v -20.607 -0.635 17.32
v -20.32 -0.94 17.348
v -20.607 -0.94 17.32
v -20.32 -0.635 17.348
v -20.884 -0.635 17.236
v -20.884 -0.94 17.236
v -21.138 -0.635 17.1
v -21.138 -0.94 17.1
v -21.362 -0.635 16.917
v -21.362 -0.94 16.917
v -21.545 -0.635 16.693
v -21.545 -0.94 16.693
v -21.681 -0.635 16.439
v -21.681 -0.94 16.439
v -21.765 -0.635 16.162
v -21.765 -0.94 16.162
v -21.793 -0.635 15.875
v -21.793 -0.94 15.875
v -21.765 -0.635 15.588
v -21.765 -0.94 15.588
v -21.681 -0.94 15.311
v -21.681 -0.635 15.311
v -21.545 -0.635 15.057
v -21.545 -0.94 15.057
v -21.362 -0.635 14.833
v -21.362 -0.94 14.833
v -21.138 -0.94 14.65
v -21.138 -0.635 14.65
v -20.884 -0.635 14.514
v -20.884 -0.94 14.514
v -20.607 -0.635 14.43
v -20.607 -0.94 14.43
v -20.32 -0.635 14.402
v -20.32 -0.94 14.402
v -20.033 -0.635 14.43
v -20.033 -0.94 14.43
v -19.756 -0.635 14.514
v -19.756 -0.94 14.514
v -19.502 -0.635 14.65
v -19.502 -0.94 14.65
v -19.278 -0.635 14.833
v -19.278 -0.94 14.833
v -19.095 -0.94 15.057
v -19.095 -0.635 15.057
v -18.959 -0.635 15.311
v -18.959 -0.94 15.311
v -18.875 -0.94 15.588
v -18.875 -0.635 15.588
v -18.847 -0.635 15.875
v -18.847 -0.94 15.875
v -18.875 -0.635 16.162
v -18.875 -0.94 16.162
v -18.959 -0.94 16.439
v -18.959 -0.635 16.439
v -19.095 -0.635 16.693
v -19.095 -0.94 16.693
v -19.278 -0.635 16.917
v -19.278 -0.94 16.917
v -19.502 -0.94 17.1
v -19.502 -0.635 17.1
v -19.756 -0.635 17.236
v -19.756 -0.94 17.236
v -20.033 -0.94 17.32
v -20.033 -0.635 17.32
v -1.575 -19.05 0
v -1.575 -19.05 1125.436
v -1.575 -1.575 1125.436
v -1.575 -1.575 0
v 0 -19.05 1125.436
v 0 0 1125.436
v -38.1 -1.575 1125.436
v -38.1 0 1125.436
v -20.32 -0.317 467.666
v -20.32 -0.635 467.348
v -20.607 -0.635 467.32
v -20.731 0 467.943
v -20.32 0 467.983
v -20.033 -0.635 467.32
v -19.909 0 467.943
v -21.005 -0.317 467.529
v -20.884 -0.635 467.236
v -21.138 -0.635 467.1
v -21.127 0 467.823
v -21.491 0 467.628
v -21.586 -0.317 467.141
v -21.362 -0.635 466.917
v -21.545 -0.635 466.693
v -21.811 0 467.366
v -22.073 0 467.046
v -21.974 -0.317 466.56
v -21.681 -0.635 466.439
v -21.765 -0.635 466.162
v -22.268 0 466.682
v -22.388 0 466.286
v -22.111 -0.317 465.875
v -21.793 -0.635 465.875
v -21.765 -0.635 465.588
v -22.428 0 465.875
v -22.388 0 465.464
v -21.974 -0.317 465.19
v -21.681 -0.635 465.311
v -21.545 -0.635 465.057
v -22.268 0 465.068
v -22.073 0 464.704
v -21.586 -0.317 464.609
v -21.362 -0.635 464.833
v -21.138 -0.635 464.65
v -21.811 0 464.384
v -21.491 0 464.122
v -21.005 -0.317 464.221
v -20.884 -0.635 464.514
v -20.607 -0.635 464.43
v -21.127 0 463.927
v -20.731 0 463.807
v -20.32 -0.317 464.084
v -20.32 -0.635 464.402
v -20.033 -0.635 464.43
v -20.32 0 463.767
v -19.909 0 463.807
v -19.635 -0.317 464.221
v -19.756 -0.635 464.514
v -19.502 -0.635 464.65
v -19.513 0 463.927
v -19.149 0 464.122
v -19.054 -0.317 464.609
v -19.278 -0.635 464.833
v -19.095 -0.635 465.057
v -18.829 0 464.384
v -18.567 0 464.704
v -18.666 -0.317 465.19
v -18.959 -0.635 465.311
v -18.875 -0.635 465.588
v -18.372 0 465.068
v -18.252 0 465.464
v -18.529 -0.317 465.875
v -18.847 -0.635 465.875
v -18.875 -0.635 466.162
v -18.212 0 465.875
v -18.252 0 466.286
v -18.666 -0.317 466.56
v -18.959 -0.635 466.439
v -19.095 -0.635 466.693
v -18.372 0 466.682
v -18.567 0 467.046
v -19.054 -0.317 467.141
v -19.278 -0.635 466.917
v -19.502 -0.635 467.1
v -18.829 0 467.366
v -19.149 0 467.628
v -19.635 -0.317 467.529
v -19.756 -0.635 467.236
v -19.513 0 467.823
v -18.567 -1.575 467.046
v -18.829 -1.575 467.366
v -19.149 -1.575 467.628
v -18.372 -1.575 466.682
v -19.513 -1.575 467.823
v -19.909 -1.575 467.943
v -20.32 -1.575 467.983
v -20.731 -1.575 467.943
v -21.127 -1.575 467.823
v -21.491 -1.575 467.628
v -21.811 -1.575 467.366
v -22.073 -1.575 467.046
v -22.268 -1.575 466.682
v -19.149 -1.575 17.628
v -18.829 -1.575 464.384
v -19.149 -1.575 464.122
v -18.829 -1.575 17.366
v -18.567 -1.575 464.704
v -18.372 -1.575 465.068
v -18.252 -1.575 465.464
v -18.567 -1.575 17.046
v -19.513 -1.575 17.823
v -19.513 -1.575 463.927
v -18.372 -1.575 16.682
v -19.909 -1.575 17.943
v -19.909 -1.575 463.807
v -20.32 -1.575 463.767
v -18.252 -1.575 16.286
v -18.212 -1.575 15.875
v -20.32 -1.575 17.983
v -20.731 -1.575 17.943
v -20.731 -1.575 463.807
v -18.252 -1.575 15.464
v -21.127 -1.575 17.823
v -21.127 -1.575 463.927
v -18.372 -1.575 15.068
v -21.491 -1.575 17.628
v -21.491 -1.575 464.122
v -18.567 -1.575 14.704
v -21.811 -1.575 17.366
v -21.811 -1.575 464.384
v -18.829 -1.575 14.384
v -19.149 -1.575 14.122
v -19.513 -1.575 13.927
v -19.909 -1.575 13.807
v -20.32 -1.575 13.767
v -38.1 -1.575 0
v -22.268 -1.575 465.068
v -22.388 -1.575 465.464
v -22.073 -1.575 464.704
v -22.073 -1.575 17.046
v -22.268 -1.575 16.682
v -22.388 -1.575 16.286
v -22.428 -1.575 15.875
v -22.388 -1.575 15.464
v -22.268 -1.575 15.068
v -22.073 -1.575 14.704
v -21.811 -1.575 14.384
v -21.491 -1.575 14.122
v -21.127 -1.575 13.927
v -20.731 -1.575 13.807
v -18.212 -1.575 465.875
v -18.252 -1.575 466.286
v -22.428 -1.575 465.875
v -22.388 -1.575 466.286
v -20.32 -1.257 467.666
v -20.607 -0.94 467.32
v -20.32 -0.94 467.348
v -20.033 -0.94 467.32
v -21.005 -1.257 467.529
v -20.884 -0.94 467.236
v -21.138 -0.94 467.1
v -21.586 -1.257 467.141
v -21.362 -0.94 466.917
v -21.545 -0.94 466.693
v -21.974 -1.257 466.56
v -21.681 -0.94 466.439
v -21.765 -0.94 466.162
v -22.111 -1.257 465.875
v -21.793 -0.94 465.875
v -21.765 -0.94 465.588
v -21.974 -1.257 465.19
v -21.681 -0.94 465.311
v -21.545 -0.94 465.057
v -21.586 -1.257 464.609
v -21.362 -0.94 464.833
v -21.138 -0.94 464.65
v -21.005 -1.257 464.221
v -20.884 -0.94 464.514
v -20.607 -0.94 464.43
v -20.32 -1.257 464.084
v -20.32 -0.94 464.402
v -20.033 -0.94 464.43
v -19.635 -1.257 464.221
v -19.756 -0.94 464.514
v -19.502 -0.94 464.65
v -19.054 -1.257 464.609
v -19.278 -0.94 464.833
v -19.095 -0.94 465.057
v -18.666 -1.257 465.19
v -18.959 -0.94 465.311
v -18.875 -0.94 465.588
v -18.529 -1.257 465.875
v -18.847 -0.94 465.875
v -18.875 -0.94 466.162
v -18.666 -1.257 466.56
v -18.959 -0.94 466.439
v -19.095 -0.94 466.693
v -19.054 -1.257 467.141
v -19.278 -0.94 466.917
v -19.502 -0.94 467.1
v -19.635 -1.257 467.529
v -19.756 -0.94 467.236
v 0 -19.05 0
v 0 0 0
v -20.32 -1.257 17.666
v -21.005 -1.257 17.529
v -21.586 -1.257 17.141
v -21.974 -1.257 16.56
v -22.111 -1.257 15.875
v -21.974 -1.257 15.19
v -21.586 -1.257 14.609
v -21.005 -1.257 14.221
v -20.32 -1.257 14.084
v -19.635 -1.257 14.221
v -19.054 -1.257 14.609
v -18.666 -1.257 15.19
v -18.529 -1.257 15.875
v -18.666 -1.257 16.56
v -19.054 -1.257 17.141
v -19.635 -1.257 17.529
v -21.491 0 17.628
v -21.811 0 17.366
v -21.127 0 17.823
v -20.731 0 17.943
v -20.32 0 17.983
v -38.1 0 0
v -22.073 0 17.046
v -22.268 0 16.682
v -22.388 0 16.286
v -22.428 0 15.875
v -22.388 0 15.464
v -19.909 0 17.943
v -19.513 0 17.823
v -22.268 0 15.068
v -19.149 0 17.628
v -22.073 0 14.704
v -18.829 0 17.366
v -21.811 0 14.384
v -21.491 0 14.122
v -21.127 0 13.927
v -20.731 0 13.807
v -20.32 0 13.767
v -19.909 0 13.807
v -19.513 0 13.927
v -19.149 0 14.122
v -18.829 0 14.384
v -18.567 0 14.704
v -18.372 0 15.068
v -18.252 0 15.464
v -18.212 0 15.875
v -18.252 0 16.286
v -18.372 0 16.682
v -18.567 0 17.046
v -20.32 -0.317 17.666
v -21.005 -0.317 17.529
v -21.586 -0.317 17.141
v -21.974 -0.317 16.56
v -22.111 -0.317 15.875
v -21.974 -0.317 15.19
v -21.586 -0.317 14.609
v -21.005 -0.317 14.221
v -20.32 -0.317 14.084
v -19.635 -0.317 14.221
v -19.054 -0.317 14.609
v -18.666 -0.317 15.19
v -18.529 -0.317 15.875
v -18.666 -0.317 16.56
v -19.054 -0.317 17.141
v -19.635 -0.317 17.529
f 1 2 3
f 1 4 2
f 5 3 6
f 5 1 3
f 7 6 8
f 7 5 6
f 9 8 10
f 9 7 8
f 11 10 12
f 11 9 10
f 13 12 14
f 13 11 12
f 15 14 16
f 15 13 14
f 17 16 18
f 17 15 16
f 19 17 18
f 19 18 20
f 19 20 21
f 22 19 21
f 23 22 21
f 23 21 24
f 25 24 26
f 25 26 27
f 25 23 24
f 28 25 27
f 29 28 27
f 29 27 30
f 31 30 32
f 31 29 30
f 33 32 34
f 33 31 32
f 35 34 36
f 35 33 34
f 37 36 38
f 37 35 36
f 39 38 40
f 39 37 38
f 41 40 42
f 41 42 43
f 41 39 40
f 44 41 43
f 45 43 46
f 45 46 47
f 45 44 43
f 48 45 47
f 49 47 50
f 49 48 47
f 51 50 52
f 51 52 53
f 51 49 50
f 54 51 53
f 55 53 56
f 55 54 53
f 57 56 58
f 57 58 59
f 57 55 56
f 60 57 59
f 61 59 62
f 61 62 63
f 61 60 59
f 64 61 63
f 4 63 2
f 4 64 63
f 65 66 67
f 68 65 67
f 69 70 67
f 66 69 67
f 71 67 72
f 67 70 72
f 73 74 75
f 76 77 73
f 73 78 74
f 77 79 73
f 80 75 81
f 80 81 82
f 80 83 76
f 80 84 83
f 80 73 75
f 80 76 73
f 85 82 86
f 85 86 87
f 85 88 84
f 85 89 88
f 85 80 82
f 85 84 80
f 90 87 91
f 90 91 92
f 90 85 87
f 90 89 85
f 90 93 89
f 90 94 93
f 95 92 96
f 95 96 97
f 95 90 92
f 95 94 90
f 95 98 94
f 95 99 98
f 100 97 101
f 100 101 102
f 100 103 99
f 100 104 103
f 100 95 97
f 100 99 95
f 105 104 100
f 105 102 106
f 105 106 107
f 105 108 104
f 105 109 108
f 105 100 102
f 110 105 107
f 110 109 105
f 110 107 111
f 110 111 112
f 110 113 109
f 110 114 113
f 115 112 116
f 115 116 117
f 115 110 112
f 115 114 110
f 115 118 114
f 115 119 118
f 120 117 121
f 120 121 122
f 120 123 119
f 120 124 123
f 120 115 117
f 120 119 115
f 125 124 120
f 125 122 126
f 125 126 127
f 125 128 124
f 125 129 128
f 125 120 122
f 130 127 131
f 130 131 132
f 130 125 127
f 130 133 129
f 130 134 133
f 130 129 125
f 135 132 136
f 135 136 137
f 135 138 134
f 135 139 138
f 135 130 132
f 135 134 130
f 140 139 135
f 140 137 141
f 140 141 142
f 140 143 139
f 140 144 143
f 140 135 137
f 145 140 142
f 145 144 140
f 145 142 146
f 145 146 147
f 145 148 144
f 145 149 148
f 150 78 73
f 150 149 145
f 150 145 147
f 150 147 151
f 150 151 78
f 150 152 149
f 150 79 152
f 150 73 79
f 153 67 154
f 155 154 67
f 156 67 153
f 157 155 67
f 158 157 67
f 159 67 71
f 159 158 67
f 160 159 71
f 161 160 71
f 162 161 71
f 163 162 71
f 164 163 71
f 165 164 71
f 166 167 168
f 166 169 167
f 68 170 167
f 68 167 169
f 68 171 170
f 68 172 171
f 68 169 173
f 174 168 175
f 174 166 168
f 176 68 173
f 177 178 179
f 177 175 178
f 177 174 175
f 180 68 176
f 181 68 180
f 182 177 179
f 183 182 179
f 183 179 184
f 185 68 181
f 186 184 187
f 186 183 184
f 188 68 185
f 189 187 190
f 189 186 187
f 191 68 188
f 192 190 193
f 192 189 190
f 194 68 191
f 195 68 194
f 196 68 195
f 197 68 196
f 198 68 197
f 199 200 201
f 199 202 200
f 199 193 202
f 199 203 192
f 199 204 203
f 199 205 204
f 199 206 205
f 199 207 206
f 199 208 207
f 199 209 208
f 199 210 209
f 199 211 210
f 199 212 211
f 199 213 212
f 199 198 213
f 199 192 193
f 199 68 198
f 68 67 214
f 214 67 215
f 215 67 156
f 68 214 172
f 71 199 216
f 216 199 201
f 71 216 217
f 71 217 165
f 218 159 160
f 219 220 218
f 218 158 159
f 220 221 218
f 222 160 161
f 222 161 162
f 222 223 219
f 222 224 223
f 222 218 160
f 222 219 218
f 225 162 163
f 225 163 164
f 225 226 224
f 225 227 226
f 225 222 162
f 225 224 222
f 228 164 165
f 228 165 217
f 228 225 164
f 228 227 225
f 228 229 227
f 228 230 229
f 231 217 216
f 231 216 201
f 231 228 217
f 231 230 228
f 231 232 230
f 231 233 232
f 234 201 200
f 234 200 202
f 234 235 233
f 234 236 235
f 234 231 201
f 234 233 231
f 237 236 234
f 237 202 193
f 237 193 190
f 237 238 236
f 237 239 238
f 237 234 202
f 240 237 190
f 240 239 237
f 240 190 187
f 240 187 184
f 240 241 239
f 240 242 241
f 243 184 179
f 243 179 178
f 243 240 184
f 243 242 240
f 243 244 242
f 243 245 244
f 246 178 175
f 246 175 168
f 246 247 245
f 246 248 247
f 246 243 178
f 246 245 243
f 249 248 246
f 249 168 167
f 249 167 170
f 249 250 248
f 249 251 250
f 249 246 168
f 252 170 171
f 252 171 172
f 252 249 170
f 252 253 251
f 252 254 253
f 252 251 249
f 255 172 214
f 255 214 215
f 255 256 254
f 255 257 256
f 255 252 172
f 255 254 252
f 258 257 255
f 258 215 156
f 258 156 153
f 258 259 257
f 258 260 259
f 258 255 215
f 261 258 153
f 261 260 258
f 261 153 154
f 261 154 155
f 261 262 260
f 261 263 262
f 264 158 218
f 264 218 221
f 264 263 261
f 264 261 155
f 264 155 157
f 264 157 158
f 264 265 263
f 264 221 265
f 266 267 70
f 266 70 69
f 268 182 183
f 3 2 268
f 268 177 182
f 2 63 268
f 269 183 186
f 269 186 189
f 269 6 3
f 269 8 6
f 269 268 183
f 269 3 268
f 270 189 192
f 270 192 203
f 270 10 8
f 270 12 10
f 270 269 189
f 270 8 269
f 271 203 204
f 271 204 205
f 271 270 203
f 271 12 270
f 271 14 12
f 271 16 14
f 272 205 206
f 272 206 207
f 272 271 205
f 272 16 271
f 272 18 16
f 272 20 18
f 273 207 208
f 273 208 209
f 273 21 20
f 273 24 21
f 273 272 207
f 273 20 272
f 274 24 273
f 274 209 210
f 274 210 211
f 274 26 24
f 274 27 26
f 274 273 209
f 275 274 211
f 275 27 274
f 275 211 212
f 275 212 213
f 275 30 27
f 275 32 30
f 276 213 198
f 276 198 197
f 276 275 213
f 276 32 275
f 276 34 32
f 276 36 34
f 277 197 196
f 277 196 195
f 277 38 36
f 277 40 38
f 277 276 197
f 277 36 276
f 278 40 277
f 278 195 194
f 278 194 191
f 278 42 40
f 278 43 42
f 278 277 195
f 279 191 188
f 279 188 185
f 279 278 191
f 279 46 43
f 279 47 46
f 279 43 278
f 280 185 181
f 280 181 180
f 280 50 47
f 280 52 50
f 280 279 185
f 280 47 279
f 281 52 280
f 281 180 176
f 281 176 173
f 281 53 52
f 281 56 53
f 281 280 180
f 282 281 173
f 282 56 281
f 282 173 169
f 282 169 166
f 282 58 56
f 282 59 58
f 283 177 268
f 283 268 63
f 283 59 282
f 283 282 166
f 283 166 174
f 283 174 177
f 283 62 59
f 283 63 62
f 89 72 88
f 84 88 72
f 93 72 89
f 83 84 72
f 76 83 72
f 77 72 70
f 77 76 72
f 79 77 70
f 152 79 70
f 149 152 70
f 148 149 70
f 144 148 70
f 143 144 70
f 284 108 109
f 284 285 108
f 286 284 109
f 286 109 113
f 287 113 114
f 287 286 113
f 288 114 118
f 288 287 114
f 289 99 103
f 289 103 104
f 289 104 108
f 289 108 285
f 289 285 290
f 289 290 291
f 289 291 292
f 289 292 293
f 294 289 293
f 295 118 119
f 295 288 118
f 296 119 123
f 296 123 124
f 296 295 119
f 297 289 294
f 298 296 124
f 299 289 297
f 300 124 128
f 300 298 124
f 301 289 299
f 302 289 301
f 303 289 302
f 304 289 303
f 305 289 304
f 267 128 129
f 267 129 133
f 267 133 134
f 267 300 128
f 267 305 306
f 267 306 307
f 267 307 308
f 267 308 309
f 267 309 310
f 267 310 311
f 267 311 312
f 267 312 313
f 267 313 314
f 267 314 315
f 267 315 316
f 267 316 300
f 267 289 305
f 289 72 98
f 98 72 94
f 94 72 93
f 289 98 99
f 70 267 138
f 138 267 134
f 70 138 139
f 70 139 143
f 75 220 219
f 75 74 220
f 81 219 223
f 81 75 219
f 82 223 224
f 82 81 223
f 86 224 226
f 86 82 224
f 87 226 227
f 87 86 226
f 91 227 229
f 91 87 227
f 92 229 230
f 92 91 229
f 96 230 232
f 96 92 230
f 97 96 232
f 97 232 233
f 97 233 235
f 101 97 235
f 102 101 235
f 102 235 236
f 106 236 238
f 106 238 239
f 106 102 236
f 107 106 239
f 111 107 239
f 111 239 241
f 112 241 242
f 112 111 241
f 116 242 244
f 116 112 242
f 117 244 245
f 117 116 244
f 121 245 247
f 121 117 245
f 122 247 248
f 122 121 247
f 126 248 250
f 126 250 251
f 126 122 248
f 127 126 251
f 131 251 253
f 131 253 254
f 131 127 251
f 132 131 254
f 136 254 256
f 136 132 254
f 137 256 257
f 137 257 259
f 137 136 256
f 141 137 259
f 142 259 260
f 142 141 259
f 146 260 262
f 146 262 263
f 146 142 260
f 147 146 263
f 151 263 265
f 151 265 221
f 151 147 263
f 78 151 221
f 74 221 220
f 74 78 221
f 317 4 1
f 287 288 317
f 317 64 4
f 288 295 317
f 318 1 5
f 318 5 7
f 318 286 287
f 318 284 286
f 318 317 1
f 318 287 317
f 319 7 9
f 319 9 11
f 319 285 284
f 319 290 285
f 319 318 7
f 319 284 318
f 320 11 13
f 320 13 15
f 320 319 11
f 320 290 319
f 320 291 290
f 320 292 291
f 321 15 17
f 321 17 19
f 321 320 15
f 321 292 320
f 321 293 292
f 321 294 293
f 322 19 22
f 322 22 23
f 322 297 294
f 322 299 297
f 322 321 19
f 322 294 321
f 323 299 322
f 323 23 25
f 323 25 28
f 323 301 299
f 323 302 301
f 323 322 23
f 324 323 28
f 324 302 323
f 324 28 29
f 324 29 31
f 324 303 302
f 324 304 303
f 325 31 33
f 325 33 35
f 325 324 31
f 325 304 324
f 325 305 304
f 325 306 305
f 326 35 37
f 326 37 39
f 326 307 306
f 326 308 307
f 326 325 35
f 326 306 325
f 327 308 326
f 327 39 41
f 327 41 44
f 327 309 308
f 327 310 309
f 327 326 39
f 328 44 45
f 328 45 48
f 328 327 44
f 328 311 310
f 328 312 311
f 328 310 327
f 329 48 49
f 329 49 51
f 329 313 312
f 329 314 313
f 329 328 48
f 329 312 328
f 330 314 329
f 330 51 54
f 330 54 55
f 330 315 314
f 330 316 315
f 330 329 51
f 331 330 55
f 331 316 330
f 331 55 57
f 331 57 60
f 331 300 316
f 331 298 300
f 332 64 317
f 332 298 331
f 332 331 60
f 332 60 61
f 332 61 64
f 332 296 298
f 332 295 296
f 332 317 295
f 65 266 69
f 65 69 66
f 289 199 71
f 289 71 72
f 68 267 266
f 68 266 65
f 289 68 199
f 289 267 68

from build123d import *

# Parameters (mm, degrees)
EXTRUDE_THIN1_DEPTH            = 1125.4359
F_4_CLEARANCE_HOLE1_AT_2_COUNT = 2
F_4_CLEARANCE_HOLE1_AT_2_PITCH = 450


with BuildPart() as part:
    # Sketch1 → Extrude-Thin1 (new body)
    with BuildSketch(Plane.XY):
        Polygon((-38.1, 0), (0, 0), (0, -19.05), (-1.5748, -19.05), (-1.5748, -1.5748), (-38.1, -1.5748), align=None)
    extrude(amount=EXTRUDE_THIN1_DEPTH)

    # Sketch2 → #4 Clearance Hole1 (revolve, cut)
    with BuildSketch(Plane(origin=(-20.32, 0, 15.875), x_dir=(0, 0, 1), z_dir=(1, 0, 0))):
        Polygon((0, 0), (0, 1.5748), (2.1082, 1.5748), (1.4732, 0.9398), (1.4732, 0.635), (2.1082, 0), align=None)
    f_4_clearance_hole1 = revolve(axis=Axis((-20.32, 6.35, 15.875), (0, -1, 0)), mode=Mode.SUBTRACT)

    # #4 Clearance Hole1 at 2: #4 Clearance Hole1 ×2
    with Locations(*[(0, 0, i * F_4_CLEARANCE_HOLE1_AT_2_PITCH) for i in range(1, F_4_CLEARANCE_HOLE1_AT_2_COUNT)]):
        add(f_4_clearance_hole1, mode=Mode.SUBTRACT)


solid = part.part
